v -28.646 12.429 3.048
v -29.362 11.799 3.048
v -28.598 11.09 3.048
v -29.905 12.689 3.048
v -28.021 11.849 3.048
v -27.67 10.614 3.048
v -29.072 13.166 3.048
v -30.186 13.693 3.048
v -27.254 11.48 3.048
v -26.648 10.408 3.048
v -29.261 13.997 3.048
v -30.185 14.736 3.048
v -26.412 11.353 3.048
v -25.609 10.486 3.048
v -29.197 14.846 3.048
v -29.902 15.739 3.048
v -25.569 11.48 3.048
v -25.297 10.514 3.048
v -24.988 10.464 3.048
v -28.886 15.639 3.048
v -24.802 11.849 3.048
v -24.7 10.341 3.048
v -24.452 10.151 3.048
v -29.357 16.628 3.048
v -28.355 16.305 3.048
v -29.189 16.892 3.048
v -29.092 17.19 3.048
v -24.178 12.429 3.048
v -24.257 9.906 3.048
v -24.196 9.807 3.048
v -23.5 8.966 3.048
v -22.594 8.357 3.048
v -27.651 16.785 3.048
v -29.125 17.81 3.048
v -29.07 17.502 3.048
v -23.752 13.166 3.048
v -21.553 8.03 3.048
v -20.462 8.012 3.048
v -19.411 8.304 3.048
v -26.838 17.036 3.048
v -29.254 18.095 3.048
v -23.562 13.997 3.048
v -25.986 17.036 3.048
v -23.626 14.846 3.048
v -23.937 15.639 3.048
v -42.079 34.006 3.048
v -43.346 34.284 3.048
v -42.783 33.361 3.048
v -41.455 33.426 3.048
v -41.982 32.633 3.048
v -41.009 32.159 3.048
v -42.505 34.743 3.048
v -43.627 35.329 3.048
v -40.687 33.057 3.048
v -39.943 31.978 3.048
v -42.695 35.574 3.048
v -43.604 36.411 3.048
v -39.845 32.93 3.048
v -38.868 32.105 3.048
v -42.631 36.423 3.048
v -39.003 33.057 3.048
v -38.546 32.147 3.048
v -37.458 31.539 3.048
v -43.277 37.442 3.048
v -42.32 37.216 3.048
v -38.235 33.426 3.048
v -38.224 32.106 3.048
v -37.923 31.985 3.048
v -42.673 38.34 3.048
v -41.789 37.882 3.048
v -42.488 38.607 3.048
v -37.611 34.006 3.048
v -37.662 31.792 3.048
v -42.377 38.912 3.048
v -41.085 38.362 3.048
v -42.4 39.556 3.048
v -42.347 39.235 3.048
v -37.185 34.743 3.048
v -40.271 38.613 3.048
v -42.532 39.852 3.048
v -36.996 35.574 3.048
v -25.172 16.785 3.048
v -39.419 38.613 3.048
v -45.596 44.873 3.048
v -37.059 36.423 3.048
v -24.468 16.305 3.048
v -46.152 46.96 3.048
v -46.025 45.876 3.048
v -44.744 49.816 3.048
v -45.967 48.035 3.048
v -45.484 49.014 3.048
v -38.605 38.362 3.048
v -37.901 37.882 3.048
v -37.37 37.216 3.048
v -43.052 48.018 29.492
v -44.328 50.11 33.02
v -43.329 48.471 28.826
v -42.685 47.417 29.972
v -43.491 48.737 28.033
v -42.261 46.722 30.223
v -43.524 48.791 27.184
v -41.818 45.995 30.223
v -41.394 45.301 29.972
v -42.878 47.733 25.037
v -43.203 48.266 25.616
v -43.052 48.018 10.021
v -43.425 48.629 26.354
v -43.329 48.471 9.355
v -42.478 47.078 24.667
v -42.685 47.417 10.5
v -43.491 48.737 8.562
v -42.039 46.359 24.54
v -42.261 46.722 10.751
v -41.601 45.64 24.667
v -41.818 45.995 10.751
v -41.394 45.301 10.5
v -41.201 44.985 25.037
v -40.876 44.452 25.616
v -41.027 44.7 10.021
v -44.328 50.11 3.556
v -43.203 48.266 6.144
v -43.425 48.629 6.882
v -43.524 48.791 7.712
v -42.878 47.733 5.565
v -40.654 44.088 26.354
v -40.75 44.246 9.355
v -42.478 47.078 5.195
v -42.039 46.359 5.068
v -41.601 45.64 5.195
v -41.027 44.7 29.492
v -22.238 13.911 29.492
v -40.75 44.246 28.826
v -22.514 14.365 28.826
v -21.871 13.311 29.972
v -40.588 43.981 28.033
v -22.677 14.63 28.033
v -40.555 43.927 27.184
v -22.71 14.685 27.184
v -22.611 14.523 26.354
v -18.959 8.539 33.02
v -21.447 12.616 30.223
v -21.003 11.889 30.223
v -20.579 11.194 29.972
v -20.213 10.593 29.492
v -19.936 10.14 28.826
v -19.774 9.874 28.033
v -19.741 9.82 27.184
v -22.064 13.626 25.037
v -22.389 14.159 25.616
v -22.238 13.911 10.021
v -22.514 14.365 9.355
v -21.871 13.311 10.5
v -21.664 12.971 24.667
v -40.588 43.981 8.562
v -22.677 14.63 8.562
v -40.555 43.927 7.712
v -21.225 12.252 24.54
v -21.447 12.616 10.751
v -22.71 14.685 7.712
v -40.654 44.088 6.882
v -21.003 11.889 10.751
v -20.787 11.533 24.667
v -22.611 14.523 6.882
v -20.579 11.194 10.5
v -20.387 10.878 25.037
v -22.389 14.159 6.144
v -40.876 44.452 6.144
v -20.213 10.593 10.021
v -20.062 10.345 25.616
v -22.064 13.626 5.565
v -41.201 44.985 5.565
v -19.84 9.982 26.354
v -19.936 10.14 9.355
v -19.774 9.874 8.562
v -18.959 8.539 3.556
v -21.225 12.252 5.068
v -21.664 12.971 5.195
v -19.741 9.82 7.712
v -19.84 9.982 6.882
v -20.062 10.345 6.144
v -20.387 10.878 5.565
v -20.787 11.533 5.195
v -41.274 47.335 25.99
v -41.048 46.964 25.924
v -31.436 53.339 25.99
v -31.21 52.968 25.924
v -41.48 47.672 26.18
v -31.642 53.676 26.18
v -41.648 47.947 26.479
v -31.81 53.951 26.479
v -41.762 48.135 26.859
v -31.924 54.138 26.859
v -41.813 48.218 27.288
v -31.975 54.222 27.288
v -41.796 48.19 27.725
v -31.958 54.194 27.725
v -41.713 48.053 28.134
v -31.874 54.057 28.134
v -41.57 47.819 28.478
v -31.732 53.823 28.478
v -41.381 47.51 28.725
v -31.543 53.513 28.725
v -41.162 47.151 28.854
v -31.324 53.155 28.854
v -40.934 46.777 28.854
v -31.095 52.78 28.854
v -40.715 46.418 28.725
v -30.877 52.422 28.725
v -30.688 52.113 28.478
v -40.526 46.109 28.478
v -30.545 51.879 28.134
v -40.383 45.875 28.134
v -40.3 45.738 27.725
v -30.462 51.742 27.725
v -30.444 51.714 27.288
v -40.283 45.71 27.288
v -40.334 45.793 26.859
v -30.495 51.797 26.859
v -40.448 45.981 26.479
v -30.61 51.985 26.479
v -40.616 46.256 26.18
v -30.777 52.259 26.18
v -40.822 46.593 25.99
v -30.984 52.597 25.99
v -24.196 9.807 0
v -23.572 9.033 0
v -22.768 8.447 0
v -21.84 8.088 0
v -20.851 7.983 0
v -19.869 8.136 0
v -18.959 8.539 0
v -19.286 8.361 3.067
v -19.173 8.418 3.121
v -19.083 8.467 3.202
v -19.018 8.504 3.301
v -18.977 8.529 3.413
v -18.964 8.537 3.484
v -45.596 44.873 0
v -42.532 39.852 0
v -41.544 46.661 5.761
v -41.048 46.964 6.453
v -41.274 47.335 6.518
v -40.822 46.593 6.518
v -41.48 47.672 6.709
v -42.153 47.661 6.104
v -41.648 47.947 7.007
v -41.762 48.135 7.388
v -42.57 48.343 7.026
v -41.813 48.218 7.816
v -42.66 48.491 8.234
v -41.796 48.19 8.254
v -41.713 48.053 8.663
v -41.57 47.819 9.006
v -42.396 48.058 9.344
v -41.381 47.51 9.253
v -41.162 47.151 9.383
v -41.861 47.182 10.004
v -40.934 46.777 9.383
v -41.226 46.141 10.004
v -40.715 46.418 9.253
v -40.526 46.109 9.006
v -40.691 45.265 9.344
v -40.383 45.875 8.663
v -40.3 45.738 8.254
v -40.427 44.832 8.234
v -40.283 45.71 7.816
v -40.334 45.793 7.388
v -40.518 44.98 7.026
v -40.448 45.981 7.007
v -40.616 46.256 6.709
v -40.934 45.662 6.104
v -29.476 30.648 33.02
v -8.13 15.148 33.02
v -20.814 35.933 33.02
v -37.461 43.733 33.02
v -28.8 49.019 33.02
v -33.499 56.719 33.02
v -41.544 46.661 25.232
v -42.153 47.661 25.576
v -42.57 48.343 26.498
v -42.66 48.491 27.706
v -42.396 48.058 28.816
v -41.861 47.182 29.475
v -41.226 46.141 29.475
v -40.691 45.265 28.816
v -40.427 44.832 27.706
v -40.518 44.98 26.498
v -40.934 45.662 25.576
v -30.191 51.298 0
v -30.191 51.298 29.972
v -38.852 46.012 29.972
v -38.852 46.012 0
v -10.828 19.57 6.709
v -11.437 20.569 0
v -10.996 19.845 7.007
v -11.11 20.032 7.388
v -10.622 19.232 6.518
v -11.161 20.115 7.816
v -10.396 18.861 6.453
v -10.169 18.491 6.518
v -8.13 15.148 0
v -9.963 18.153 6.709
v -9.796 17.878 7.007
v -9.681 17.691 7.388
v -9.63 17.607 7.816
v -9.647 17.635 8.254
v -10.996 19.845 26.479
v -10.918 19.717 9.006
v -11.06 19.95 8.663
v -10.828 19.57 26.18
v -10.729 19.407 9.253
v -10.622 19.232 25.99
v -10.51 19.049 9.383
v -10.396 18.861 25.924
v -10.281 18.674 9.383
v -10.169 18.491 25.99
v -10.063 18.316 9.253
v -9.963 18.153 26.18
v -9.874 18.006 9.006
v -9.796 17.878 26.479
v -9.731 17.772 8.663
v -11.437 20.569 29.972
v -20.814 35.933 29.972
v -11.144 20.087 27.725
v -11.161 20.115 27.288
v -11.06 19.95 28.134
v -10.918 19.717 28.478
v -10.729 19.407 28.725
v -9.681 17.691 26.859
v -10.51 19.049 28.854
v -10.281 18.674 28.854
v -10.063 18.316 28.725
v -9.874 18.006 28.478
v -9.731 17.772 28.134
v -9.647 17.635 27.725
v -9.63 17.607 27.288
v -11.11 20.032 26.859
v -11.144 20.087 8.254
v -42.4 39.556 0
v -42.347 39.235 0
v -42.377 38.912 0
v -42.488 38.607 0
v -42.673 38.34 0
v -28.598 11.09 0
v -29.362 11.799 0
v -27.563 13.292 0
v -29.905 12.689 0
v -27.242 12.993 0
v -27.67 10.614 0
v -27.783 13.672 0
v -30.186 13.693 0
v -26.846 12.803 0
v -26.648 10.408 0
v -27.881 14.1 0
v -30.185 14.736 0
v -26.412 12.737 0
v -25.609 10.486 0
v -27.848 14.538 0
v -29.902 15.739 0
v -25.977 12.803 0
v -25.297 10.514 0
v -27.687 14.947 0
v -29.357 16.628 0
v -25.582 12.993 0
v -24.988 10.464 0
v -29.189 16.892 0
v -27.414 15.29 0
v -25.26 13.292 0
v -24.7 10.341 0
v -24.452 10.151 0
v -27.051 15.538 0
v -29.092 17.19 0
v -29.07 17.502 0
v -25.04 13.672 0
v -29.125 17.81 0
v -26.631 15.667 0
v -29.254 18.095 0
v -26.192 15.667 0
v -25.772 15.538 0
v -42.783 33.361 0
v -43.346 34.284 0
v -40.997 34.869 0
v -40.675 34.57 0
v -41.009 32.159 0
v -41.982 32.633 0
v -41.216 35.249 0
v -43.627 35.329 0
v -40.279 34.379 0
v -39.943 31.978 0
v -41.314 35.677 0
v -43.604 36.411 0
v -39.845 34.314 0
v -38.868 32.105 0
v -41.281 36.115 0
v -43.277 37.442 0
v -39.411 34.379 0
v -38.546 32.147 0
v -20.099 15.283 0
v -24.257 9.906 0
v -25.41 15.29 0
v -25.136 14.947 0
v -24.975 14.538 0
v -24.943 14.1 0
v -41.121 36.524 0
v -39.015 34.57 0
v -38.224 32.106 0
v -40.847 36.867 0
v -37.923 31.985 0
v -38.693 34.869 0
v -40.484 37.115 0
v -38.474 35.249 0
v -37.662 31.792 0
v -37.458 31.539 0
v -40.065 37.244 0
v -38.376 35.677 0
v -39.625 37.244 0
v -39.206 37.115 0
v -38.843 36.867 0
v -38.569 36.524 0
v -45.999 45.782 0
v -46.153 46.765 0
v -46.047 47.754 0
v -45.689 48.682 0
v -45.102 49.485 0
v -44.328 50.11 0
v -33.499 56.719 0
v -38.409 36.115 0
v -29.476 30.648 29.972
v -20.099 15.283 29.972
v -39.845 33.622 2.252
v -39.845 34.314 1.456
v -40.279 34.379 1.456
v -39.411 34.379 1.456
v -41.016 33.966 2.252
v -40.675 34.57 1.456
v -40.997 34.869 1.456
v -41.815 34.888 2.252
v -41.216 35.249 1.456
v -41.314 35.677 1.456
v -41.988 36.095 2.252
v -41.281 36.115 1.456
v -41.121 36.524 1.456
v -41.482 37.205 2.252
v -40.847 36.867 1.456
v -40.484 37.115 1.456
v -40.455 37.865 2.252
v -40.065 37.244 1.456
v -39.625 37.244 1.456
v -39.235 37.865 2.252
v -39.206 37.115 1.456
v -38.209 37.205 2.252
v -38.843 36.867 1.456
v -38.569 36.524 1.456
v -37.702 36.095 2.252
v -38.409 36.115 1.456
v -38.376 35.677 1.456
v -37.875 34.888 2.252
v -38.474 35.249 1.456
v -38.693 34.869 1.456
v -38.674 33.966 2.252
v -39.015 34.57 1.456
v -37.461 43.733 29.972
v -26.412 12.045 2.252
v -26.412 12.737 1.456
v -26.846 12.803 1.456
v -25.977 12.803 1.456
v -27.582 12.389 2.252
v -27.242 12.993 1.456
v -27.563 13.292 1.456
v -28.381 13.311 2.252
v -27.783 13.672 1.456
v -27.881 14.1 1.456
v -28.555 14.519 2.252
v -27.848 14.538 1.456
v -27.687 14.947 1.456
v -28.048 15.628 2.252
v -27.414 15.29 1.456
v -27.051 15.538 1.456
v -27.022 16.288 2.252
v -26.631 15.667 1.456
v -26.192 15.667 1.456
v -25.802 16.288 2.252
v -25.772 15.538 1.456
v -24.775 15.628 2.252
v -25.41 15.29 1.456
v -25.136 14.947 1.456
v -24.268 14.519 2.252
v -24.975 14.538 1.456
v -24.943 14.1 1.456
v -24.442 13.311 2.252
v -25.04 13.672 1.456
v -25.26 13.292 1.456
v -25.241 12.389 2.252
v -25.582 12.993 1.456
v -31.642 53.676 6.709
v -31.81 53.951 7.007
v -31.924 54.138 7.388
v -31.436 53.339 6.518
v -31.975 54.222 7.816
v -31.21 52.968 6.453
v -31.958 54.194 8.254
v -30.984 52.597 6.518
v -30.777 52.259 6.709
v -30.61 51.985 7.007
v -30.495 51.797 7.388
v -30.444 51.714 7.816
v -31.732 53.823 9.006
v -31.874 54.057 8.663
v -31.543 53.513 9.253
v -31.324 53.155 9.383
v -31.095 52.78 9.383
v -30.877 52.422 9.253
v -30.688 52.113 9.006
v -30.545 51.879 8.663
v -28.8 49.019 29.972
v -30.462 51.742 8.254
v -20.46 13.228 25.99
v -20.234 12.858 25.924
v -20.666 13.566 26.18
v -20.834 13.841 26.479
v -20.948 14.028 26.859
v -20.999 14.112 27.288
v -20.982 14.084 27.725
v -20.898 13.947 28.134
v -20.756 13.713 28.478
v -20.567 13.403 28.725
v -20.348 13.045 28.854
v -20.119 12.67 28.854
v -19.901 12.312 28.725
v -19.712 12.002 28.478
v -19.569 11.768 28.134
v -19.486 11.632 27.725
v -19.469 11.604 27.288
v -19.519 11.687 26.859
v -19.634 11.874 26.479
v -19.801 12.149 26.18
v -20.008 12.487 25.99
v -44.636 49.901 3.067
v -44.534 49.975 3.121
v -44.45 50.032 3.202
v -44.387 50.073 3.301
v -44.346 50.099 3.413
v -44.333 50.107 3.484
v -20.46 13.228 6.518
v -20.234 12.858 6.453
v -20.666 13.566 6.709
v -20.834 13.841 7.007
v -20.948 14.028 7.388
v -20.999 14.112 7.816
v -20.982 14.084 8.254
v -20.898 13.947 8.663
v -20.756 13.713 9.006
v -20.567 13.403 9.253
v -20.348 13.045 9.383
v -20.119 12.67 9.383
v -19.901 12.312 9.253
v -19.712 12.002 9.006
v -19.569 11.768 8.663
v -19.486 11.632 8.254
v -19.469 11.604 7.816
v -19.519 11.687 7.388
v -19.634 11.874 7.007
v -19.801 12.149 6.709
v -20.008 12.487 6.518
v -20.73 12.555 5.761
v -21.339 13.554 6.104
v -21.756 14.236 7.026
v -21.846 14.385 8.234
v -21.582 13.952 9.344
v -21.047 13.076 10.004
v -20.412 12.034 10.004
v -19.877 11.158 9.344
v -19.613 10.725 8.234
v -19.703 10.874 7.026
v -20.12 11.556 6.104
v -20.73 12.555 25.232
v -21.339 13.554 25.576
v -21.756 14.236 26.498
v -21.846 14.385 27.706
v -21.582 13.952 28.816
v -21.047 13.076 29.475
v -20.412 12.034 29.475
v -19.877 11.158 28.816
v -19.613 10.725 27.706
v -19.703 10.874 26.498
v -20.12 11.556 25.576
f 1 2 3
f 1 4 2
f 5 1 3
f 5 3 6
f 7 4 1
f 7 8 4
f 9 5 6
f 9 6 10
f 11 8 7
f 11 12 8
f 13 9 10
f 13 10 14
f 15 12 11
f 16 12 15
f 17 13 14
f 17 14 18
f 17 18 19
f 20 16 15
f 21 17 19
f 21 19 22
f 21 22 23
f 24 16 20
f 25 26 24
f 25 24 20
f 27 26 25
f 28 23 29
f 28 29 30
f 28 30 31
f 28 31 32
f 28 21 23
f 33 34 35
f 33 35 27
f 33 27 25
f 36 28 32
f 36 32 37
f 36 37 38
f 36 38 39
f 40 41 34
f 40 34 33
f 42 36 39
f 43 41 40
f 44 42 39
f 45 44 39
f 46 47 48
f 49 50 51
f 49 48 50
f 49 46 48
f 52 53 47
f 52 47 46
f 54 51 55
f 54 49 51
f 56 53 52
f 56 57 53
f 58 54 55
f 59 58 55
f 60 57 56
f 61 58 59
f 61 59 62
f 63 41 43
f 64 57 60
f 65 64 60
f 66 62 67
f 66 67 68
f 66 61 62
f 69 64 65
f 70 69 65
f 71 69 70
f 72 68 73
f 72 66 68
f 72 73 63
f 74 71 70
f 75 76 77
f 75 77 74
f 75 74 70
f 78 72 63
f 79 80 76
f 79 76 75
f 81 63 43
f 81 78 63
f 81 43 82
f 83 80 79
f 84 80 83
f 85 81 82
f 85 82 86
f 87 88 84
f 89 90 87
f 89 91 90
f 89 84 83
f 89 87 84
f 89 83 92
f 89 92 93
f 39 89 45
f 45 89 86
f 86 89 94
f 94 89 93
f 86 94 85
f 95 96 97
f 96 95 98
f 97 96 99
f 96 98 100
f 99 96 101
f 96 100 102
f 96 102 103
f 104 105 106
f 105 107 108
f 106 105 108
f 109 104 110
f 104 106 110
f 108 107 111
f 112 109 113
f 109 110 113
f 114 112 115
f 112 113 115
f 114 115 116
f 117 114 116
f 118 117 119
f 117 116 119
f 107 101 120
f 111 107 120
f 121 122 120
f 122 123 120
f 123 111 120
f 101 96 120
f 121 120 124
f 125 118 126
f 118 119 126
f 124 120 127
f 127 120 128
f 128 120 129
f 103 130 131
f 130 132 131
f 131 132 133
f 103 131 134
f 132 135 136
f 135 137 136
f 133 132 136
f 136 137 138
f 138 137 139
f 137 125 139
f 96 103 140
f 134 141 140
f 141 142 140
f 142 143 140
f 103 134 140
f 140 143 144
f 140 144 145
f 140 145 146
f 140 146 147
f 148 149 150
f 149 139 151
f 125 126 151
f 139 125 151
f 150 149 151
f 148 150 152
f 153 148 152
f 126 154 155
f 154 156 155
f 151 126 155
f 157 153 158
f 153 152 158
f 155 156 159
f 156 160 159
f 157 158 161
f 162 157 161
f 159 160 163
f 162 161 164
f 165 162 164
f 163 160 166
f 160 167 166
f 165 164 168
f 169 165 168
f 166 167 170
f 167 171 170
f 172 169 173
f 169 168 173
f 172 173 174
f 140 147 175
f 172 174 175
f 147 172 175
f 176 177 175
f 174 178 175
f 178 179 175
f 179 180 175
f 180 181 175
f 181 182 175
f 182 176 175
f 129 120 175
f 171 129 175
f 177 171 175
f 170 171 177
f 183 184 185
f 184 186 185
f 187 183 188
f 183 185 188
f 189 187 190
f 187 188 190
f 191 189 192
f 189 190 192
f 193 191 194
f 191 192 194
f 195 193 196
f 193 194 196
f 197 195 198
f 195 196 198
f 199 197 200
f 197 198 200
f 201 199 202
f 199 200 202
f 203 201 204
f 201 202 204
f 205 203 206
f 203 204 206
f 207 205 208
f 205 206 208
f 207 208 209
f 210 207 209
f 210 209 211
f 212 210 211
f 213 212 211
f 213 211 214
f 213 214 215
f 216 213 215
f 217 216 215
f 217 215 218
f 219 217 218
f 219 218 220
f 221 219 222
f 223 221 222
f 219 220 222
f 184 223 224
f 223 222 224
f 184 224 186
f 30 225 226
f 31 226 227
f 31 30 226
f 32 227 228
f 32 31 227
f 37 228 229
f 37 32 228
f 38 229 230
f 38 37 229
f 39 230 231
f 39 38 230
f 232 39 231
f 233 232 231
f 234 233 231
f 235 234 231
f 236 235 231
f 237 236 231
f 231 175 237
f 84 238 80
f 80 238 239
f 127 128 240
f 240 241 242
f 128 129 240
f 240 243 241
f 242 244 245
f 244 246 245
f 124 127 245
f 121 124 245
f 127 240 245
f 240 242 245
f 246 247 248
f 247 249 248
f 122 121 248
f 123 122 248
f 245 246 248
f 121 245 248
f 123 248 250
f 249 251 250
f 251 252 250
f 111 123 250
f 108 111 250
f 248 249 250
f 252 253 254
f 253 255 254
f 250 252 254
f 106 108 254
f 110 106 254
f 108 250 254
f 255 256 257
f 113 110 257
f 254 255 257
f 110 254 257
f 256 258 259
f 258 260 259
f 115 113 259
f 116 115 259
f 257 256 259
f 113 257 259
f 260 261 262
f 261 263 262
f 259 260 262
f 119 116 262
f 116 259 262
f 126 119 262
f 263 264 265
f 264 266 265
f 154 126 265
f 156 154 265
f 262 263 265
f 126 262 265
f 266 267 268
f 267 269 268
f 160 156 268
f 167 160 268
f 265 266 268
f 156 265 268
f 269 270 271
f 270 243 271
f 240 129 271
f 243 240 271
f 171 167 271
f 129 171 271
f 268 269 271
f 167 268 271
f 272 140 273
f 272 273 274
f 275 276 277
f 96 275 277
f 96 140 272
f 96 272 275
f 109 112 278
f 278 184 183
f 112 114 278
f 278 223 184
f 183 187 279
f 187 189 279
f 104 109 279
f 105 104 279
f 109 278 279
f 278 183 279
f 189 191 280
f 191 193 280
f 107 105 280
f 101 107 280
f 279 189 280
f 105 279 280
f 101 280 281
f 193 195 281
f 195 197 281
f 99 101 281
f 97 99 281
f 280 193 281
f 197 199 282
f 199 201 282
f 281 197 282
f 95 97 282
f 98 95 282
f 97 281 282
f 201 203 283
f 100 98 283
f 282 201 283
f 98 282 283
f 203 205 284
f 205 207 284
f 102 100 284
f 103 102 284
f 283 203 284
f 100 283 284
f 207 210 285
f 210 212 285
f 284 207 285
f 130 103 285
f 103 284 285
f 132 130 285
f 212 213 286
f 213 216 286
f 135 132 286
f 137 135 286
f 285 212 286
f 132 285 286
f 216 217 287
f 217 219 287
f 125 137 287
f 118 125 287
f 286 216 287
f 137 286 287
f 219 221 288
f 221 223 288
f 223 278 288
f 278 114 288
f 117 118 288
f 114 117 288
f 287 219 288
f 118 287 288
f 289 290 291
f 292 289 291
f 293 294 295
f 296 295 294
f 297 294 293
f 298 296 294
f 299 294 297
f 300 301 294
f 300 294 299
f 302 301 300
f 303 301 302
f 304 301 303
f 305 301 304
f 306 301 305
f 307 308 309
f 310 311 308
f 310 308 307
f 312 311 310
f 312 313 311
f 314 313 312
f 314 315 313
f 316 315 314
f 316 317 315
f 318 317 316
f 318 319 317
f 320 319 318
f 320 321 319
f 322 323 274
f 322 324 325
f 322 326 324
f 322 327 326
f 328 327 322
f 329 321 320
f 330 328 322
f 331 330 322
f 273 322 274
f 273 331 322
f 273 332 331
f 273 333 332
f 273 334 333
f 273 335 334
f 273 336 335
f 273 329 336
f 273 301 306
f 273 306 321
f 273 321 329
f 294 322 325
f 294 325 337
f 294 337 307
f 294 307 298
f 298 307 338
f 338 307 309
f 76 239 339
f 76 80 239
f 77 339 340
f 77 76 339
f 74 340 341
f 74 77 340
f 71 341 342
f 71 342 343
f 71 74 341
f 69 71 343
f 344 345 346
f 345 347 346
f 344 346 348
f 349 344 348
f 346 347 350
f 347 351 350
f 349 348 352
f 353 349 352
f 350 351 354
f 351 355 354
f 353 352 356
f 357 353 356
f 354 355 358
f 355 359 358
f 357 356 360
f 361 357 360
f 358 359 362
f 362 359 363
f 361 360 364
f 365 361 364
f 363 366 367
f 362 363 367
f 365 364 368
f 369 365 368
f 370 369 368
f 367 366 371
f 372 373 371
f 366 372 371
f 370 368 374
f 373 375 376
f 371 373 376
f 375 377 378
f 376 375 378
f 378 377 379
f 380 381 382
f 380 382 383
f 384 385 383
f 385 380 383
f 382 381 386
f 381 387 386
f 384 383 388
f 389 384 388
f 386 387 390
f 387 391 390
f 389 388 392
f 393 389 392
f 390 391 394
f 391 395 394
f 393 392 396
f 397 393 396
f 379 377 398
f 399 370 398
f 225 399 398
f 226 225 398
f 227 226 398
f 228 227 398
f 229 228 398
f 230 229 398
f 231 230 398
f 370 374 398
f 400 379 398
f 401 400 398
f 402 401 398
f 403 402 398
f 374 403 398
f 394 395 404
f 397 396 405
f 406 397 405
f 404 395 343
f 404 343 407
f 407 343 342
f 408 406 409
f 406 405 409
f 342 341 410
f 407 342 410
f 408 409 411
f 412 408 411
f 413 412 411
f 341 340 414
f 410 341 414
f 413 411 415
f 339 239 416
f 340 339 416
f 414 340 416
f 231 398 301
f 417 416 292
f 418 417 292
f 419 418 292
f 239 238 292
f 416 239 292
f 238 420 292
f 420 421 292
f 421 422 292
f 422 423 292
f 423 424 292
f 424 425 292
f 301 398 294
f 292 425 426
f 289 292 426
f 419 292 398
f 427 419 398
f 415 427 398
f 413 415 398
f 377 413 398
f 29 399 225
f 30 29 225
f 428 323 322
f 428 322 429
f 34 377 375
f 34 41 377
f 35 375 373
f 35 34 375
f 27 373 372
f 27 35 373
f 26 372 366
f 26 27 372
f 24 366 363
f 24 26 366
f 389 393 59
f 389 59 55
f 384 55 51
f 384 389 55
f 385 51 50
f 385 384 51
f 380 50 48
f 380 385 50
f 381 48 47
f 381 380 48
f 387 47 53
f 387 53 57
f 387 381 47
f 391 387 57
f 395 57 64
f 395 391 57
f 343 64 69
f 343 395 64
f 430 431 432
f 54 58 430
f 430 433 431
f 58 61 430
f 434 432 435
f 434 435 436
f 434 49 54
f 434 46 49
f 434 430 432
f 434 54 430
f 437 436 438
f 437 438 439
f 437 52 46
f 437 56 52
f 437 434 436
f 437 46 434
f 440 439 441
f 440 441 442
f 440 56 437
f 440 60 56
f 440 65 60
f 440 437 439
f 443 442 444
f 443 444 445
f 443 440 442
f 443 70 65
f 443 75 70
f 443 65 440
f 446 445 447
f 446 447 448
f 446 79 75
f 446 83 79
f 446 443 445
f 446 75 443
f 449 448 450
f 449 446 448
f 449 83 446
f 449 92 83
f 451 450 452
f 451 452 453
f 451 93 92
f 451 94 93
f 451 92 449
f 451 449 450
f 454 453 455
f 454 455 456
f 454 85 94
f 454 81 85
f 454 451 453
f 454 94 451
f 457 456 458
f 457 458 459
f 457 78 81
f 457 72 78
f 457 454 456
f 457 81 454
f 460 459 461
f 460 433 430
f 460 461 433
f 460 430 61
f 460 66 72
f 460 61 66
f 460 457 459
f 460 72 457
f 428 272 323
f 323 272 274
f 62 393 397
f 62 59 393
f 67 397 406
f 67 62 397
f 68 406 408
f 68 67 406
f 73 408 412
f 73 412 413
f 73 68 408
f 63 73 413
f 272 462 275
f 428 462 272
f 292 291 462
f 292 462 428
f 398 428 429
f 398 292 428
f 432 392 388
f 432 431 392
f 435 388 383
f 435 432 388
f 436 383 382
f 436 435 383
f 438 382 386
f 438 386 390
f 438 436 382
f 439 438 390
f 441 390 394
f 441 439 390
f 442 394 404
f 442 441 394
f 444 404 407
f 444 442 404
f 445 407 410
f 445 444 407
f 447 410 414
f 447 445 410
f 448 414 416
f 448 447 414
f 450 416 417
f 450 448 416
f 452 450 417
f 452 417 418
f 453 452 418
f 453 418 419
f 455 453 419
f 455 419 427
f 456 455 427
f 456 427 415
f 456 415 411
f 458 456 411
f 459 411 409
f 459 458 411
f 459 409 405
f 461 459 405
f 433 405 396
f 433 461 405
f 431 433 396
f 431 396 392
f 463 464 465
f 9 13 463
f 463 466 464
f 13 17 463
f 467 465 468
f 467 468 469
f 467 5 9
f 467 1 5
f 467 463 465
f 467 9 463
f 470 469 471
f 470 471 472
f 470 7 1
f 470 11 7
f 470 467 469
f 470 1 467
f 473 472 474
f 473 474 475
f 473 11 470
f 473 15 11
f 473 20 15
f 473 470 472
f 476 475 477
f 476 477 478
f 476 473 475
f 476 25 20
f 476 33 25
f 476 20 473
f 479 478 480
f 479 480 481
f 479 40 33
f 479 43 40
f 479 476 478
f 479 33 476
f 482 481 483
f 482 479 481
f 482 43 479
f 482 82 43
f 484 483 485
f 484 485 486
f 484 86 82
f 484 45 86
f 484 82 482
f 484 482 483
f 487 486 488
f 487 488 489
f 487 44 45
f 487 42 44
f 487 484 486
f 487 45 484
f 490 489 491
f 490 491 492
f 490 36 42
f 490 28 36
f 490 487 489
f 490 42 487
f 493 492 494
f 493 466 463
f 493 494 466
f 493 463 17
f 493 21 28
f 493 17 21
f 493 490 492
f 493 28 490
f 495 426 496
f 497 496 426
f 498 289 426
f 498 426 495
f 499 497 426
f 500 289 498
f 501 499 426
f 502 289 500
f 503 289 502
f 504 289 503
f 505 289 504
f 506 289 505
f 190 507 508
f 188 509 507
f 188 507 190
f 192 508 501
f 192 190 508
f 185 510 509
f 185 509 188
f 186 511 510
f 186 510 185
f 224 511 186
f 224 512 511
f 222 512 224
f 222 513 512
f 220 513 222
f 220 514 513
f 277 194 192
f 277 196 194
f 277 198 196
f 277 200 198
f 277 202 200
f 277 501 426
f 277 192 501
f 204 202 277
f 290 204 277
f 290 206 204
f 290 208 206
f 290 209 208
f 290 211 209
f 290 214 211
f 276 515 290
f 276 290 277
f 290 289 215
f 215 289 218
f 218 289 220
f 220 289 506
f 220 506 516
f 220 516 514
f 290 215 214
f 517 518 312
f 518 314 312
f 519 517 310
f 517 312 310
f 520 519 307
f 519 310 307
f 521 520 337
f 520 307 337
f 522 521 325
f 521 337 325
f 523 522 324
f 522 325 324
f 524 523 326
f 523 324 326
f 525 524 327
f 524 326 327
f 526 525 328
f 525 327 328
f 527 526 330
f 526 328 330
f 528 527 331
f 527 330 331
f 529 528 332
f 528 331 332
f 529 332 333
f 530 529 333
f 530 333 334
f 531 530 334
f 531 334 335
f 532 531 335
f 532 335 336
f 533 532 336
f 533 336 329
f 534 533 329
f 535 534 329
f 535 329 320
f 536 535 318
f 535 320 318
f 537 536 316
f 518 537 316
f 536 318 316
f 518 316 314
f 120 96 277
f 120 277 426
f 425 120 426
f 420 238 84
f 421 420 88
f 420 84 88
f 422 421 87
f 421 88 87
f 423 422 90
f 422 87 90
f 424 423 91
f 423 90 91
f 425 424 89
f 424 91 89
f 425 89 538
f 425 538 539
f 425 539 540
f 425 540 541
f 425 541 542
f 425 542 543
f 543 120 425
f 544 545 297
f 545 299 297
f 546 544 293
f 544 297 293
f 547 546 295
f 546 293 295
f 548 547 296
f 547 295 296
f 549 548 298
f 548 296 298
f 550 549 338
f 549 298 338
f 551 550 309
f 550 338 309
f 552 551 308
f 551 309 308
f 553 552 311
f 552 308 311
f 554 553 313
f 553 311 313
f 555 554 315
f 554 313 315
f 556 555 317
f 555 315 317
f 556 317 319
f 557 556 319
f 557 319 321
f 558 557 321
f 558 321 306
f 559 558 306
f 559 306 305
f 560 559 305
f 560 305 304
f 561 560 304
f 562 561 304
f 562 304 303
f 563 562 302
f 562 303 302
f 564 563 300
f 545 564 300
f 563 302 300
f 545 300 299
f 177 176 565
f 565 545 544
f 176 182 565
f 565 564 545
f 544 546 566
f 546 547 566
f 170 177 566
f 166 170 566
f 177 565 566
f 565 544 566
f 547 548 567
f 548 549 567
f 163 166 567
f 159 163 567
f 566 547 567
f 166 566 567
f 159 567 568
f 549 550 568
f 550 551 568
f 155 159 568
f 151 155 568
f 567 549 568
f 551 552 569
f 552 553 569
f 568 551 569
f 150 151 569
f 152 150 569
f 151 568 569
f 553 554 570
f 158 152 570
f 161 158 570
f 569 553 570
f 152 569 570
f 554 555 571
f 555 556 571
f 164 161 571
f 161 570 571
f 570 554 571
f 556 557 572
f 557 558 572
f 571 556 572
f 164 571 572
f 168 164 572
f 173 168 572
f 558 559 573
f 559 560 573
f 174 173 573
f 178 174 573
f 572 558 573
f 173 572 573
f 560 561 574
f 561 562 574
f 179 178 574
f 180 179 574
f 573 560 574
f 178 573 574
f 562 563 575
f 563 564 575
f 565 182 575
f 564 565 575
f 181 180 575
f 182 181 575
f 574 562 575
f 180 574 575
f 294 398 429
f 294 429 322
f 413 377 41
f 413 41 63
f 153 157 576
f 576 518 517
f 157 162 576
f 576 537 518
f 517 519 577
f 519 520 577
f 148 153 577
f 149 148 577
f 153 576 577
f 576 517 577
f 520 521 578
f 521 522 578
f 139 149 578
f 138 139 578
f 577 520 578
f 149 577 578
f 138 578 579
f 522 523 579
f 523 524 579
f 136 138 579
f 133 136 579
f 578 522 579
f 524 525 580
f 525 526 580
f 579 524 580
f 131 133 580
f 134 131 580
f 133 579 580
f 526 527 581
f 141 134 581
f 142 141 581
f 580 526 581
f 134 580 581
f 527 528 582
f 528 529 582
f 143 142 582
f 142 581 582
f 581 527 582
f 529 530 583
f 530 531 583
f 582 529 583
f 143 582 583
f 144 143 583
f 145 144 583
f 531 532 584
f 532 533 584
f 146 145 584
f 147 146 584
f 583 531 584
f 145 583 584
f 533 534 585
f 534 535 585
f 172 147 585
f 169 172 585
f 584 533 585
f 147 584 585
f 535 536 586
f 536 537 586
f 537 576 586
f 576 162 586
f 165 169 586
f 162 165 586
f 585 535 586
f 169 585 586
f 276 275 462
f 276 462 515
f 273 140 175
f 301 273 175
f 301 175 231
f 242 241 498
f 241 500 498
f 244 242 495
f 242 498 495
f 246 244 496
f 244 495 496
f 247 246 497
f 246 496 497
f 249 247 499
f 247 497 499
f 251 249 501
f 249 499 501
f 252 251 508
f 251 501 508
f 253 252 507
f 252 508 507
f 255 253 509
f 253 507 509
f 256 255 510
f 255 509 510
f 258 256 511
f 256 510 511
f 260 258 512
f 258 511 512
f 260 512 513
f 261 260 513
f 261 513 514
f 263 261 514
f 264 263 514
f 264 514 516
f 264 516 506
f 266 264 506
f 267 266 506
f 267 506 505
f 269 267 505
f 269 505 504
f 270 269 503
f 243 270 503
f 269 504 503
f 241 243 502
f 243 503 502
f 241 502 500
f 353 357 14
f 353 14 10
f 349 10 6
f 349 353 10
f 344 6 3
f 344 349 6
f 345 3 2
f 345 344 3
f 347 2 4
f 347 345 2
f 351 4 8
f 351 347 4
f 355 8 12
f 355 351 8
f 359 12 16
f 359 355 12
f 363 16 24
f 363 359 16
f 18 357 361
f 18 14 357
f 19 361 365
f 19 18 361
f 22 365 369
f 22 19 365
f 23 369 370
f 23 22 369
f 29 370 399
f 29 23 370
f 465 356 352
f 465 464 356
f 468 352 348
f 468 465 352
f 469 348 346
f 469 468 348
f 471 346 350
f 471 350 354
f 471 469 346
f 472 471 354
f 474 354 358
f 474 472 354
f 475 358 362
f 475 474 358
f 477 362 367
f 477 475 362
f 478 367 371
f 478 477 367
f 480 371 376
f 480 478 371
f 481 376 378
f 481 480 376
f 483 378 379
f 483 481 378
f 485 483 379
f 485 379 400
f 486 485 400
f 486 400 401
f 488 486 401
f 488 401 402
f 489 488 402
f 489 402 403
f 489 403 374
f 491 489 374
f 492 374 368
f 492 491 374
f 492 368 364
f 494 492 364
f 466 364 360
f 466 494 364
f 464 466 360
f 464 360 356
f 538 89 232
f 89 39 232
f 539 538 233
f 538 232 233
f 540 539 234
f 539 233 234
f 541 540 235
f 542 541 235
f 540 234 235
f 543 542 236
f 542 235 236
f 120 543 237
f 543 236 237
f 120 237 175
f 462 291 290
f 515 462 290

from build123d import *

# Parameters (mm, degrees)
BOSS_EXTRUDE1_DEPTH                               = 3.048
BOSS_EXTRUDE2_DEPTH                               = 29.971999999999998
BOSS_EXTRUDE3_DEPTH                               = 3.048
BOSS_EXTRUDE4_DEPTH                               = 3.048
SKETCH13_W                                        = 29.972
SKETCH13_H                                        = 48.7
BOSS_EXTRUDE5_DEPTH                               = 3.048
CSK_FOR_4_FLAT_HEAD_MACHINE_SCREW_100_D           = 2.9464
CSK_FOR_4_FLAT_HEAD_MACHINE_SCREW_100_CSINK_D     = 5.715
CSK_FOR_4_FLAT_HEAD_MACHINE_SCREW_100_CSINK_ANGLE = 100
CUT_EXTRUDE1_DEPTH                                = 1.397
CUT_EXTRUDE1_DEPTH_BACK                           = 1.397
SKETCH15_R                                        = 9.184035329670005
SKETCH15_R_2                                      = 8.124741076595411
SKETCH15_R_3                                      = 8.201451240556812
SKETCH15_R_4                                      = 5.810172256980604
BOSS_EXTRUDE6_DEPTH                               = 3.048
CSK_FOR_4_FLAT_HEAD_MACHINE_SCREW1_AT_2_COUNT     = 2
CSK_FOR_4_FLAT_HEAD_MACHINE_SCREW1_AT_2_PITCH     = 35.474094707842795
CSK_FOR_4_FLAT_HEAD_MACHINE_SCREW1_AT_3_COUNT     = 2
CSK_FOR_4_FLAT_HEAD_MACHINE_SCREW1_AT_3_PITCH     = 43.70753982500484
CSK_FOR_4_FLAT_HEAD_MACHINE_SCREW1_AT_4_COUNT     = 2
CSK_FOR_4_FLAT_HEAD_MACHINE_SCREW1_AT_4_PITCH     = 25.069264350610375
CUT_EXTRUDE2_DEPTH                                = 3.048
FILLET3_R                                         = 3.8099999999999996
FILLET4_R                                         = 1.27
SKETCH21_W                                        = 2.540000000000001
SKETCH21_H                                        = 33.02
CUT_EXTRUDE3_DEPTH                                = 77.47
FILLET5_R                                         = 0.508
FILLET6_R                                         = 0.508
SKETCH22_W                                        = 123.04970813102194
SKETCH22_H                                        = 134.7131875745612
CUT_EXTRUDE4_DEPTH                                = 61.72200000000001


with BuildPart() as part:
    # Sketch2 → Boss-Extrude1 (new body)
    with BuildSketch(Plane.XY):
        Polygon((-47.58059551455695, 48.12489153745831), (-22.21147896413696, 6.554494312375088), (5.701292889255674, 23.58878817682547), (-19.667823661164306, 65.1591854019087), align=None)
        Polygon((-38.85234269167306, 46.0124042215628), (-20.098991648241444, 15.282747135258976), (-3.0269599336282123, 25.701275492720985), (-21.78031097705982, 56.430932579024805), align=None, mode=Mode.SUBTRACT)
    extrude(amount=BOSS_EXTRUDE1_DEPTH)

    # Sketch3 → Boss-Extrude2 (add)
    with BuildSketch(Plane.XY.offset(3.048)):
        Polygon((2.4490708476218597, 21.604058524728963), (-22.920045702798127, 63.17445574981219), (-44.328373472923126, 50.10962118955482), (-18.95925692250314, 8.539223964471608), align=None)
        Polygon((-38.85234269167306, 46.0124042215628), (-20.098991648241444, 15.282747135258976), (-3.0269599336282087, 25.701275492720985), (-21.78031097705982, 56.430932579024805), align=None, mode=Mode.SUBTRACT)
    extrude(amount=BOSS_EXTRUDE2_DEPTH)

    # Sketch4 → Boss-Extrude3 (add)
    with BuildSketch(Plane.XY.offset(33.02)):
        Polygon((-38.85234269167306, 46.0124042215628), (-37.46131723814535, 43.733039051773666), (-20.389285523532113, 54.15156740923567), (-21.78031097705982, 56.430932579024805), align=None)
        Polygon((-29.47566716995725, 30.647575678410885), (-12.403635455344016, 41.0661040358729), (-3.0269599336282087, 25.701275492720985), (-20.098991648241444, 15.282747135258976), align=None)
    extrude(amount=-BOSS_EXTRUDE3_DEPTH)

    # Sketch12 → Boss-Extrude4 (add)
    with BuildSketch(Plane.XY.offset(3.048)):
        Polygon((2.4490708476218597, 21.604058524728963), (5.701292889255674, 23.58878817682547), (8.120429940678708, 25.065112049236276), (-17.248686609741274, 66.6355092743195), (-22.920045702798127, 63.17445574981219), align=None)
    extrude(amount=-BOSS_EXTRUDE4_DEPTH)

    # Sketch13 → Boss-Extrude5 (add)
    with BuildSketch(Plane(origin=(11.391019162328917, 6.95158362794815, 0), x_dir=(0, 0, -1), z_dir=(0.8536015857306615, 0.5209264178731006, 0))):
        with Locations((-18.034000000000002, 41.515472911157566)):
            Rectangle(SKETCH13_W, SKETCH13_H)
    extrude(amount=BOSS_EXTRUDE5_DEPTH)

    # CSK for #4 Flat Head Machine Screw (100)2 (through all)
    with Locations(Plane(origin=(-10.017308607796087, -6.113250932309213, 0), x_dir=(0, 0, 1), z_dir=(-0.8536015857306615, -0.5209264178731007, 0))):
        with Locations((27.397617355, 61.471448289), (7.925915452, 61.471448289), (7.925915452, 21.515515982), (27.397617355, 21.515515982)):
            CounterSinkHole(CSK_FOR_4_FLAT_HEAD_MACHINE_SCREW_100_D / 2, CSK_FOR_4_FLAT_HEAD_MACHINE_SCREW_100_CSINK_D / 2, counter_sink_angle=CSK_FOR_4_FLAT_HEAD_MACHINE_SCREW_100_CSINK_ANGLE)

    # Sketch14 → Cut-Extrude1 (cut, two sides: drawn at the far end of the back side and taken through both)
    with BuildSketch(Plane(origin=(11.607833965104508, 7.083898938087922, 0), x_dir=(0, 0, -1), z_dir=(0.8536015857306615, 0.5209264178731005, 0)).offset(-CUT_EXTRUDE1_DEPTH_BACK)):
        Polygon((-30.697174143874744, 19.61051598216394), (-30.697174143874744, 14.979833054183299), (-24.09806056703731, 14.979833054183299), (-24.09806056703731, 19.610515982163985), (-24.098060567037347, 23.42051598216399), (-27.39761735545604, 25.325515982163957), (-30.697174143874758, 23.420515982163952), align=None)
        Polygon((-27.39761735545604, 57.661448288693826), (-24.098060567037333, 59.56644828869383), (-24.098060567037336, 63.37644828869381), (-24.098060567037336, 70.99644828869384), (-30.69717414387474, 70.99644828869384), (-30.69717414387474, 63.37644828869381), (-30.69717414387474, 59.56644828869381), align=None)
        Polygon((-7.925915451689084, 57.661448288693826), (-4.626358663270381, 59.56644828869382), (-4.626358663270402, 63.37644828869381), (-4.626358663270402, 70.99644828869384), (-11.225472240107786, 70.99644828869384), (-11.225472240107786, 63.376448288693766), (-11.225472240107747, 59.566448288693785), align=None)
        Polygon((-7.925915451689081, 25.325515982163946), (-11.225472240107791, 23.42051598216395), (-11.225472240107791, 19.610515982163946), (-11.225472240107791, 14.979833054183299), (-4.626358663270366, 14.979833054183299), (-4.626358663270366, 19.610515982163953), (-4.6263586632703655, 23.420515982163952), align=None)
    extrude(amount=CUT_EXTRUDE1_DEPTH + CUT_EXTRUDE1_DEPTH_BACK, mode=Mode.SUBTRACT)

    # Sketch15 → Boss-Extrude6 (add)
    with BuildSketch(Plane(origin=(0, 0, 0), x_dir=(-1, 0, 0), z_dir=(0, 0, -1))):
        with Locations((9.758086495919196, 54.36124573948299)):
            Circle(SKETCH15_R)
        with Locations((39.927818301519274, 35.58488100974543)):
            Circle(SKETCH15_R_2)
        with Locations((25.610425726235285, 18.04643091882164)):
            Circle(SKETCH15_R_3)
        with Locations((-3.4576236647063787, 32.70568986323082)):
            Circle(SKETCH15_R_4)
    extrude(amount=-BOSS_EXTRUDE6_DEPTH)

    # Sketch19 → CSK for #4 Flat Head Machine Screw1 (revolve, cut)
    with BuildSketch(Plane(origin=(3.764373982237945, 32.86032278852424, 3.048), x_dir=(0, -1, 0), z_dir=(1, 0, 0))):
        Polygon((0, 0), (-7.5e-16, 3.0480000000000023), (1.4731999999999932, 3.0480000000000023), (1.4731999999999934, 1.59245498611605), (2.857499999999999, -1.73e-15), align=None)
    csk_for_4_flat_head_machine_screw1 = revolve(axis=Axis((3.764373982237945, 32.86032278852424, 9.39799999999999), (0, 0, -1)), mode=Mode.SUBTRACT)

    # CSK for #4 Flat Head Machine Screw1 at 2: CSK for #4 Flat Head Machine Screw1 ×2
    with Locations(*[Vector(-0.8506492202713736, -0.5257336816789507, 0) * (i * CSK_FOR_4_FLAT_HEAD_MACHINE_SCREW1_AT_2_PITCH) for i in range(1, CSK_FOR_4_FLAT_HEAD_MACHINE_SCREW1_AT_2_COUNT)]):
        add(csk_for_4_flat_head_machine_screw1, mode=Mode.SUBTRACT)

    # CSK for #4 Flat Head Machine Screw1 at 3: CSK for #4 Flat Head Machine Screw1 ×2
    with Locations(*[Vector(-0.997755305773639, 0.06696528802709796, 0) * (i * CSK_FOR_4_FLAT_HEAD_MACHINE_SCREW1_AT_3_PITCH) for i in range(1, CSK_FOR_4_FLAT_HEAD_MACHINE_SCREW1_AT_3_COUNT)]):
        add(csk_for_4_flat_head_machine_screw1, mode=Mode.SUBTRACT)

    # CSK for #4 Flat Head Machine Screw1 at 4: CSK for #4 Flat Head Machine Screw1 ×2
    with Locations(*[Vector(-0.5210117203175807, 0.8535495224600124, 0) * (i * CSK_FOR_4_FLAT_HEAD_MACHINE_SCREW1_AT_4_PITCH) for i in range(1, CSK_FOR_4_FLAT_HEAD_MACHINE_SCREW1_AT_4_COUNT)]):
        add(csk_for_4_flat_head_machine_screw1, mode=Mode.SUBTRACT)

    # Sketch20 → Cut-Extrude2 (cut)
    with BuildSketch(Plane(origin=(0, 0, 0), x_dir=(-1, 0, 0), z_dir=(0, 0, -1))):
        with BuildLine():
            Line((14.542293121824187, 62.20075286029573), (11.563953125478477, 57.32037886408755))
            ThreePointArc((11.563953125478477, 57.32037886408755), (6.044784522535942, 56.24291105550805), (7.610320649443919, 50.84186897257834))
            Line((7.610320649443919, 50.84186897257834), (-1.4954062126549716, 35.92102291440944))
            ThreePointArc((-1.4954062126549716, 35.92102291440944), (-7.016596023871767, 34.845052440620755), (-5.448804035753348, 29.442897530407524))
            Line((-5.448804035753348, 29.442897530407524), (-6.484295885760952, 27.746117611303884))
            Line((-6.484295885760952, 27.746117611303884), (-6.762670750549963, 27.28996638176623))
            Line((-6.762670750549963, 27.28996638176623), (-14.061950278269341, 31.74448896114331))
            Line((-14.061950278269341, 31.74448896114331), (8.559037851416688, 68.81174198534737))
            Line((8.559037851416688, 68.81174198534737), (14.542293121824187, 65.16034795406075))
            Line((14.542293121824187, 65.16034795406075), (14.542293121824187, 62.20075286029573))
        make_face()
        Polygon((21.78031097705982, 56.430932579024805), (38.85234269167306, 46.0124042215628), (20.098991648241444, 15.282747135258976), (3.0269599336282123, 25.701275492720985), align=None)
        with BuildLine():
            Line((22.21147896413696, 6.554494312375088), (24.781951964671258, 10.766528400207497))
            ThreePointArc((24.781951964671258, 10.766528400207497), (29.66385906245521, 12.225666721445755), (28.72915433514684, 17.23450177808784))
            Line((28.72915433514684, 17.23450177808784), (38.012718373529104, 32.44675577885475))
            ThreePointArc((38.012718373529104, 32.44675577885475), (43.097277822107074, 33.802481129765034), (41.97793801322115, 38.944252653808825))
            Line((41.97793801322115, 38.944252653808825), (47.58059551455695, 48.12489153745831))
            Line((47.58059551455695, 48.12489153745831), (51.80171473929435, 35.787210781861546))
            Line((51.80171473929435, 35.787210781861546), (47.57680035710003, 5.227667032097241))
            Line((47.57680035710003, 5.227667032097241), (22.21147896413696, 6.554494312375088))
        make_face()
    extrude(amount=-CUT_EXTRUDE2_DEPTH, mode=Mode.SUBTRACT)


with BuildPart() as body_2:
    # of the pieces the cut leaves, the one that is kept (cut_extrude2_keep)
    add(part.part.solids().sort_by_distance((-47.580595515, 48.124891537, 0))[0])

    # Fillet3
    fillet3_edges = [body_2.edges().sort_by_distance(p)[0] for p in [
        (-17.248686609741274, 66.6355092743195, 1.524),
        (-47.58059551455695, 48.12489153745831, 1.524),
        (-22.21147896413696, 6.554494312375088, 1.524),
        (8.120429940678708, 25.065112049236276, 1.524),
    ]]
    fillet(fillet3_edges, radius=FILLET3_R)

    # Fillet4
    fillet4_edges = [body_2.edges().sort_by_distance(p)[0] for p in [
        (1.4954062126549714, 35.92102291440944, 1.524),
        (-24.781951964671258, 10.766528400207495, 1.524),
        (-28.72915433514684, 17.23450177808784, 1.524),
        (-38.0127183735291, 32.44675577885475, 1.524),
        (-41.97793801322115, 38.94425265380882, 1.524),
        (-11.563953125478475, 57.320378864087544, 1.524),
        (-7.610320649443917, 50.84186897257834, 1.524),
    ]]
    fillet(fillet4_edges, radius=FILLET4_R)

    # Sketch21 → Cut-Extrude3 (cut)
    with BuildSketch(Plane(origin=(-8.941948314707059, 14.652474896780824, 0), x_dir=(0.8536015857306616, 0.5209264178731006, 0), z_dir=(0.5209264178731005, -0.8536015857306615, 0))):
        with Locations((2.2216732427396275, 16.51)):
            Rectangle(SKETCH21_W, SKETCH21_H)
    extrude(amount=-CUT_EXTRUDE3_DEPTH, mode=Mode.SUBTRACT)


with BuildPart() as cut_extrude3_piece_1:
    # of the separate pieces the step leaves, piece 1, a body of its own (cut_extrude3_pieces)
    add(body_2.part.solids().sort_by_distance((-12.188709065, 58.344117807, 0))[0])

    # Fillet6
    fillet6_edges = [cut_extrude3_piece_1.edges().sort_by_distance(p)[0] for p in [
        (-7.633709794281099, 43.97704085894782, 3.048),
    ]]
    fillet(fillet6_edges, radius=FILLET6_R)

    # Sketch22 → Cut-Extrude4 (cut)
    with BuildSketch(Plane(origin=(2.067982642978631, 1.2620252919381492, 0), x_dir=(0, 0, -1), z_dir=(0.8536015857306616, 0.5209264178731006, 0))):
        with Locations((-42.687564536567926, 74.45417523171726)):
            Rectangle(SKETCH22_W, SKETCH22_H)
    extrude(amount=CUT_EXTRUDE4_DEPTH, mode=Mode.SUBTRACT)


with BuildPart() as cut_extrude3_piece_2:
    # of the separate pieces the step leaves, piece 2, a body of its own (cut_extrude3_pieces)
    add(body_2.part.solids().sort_by_distance((-42.532157132, 39.852408399, 0))[0])

    # Fillet5
    fillet5_edges = [cut_extrude3_piece_2.edges().sort_by_distance(p)[0] for p in [
        (-31.64381519771313, 29.324422577013216, 3.048),
    ]]
    fillet(fillet5_edges, radius=FILLET5_R)


solid = cut_extrude3_piece_2.part
